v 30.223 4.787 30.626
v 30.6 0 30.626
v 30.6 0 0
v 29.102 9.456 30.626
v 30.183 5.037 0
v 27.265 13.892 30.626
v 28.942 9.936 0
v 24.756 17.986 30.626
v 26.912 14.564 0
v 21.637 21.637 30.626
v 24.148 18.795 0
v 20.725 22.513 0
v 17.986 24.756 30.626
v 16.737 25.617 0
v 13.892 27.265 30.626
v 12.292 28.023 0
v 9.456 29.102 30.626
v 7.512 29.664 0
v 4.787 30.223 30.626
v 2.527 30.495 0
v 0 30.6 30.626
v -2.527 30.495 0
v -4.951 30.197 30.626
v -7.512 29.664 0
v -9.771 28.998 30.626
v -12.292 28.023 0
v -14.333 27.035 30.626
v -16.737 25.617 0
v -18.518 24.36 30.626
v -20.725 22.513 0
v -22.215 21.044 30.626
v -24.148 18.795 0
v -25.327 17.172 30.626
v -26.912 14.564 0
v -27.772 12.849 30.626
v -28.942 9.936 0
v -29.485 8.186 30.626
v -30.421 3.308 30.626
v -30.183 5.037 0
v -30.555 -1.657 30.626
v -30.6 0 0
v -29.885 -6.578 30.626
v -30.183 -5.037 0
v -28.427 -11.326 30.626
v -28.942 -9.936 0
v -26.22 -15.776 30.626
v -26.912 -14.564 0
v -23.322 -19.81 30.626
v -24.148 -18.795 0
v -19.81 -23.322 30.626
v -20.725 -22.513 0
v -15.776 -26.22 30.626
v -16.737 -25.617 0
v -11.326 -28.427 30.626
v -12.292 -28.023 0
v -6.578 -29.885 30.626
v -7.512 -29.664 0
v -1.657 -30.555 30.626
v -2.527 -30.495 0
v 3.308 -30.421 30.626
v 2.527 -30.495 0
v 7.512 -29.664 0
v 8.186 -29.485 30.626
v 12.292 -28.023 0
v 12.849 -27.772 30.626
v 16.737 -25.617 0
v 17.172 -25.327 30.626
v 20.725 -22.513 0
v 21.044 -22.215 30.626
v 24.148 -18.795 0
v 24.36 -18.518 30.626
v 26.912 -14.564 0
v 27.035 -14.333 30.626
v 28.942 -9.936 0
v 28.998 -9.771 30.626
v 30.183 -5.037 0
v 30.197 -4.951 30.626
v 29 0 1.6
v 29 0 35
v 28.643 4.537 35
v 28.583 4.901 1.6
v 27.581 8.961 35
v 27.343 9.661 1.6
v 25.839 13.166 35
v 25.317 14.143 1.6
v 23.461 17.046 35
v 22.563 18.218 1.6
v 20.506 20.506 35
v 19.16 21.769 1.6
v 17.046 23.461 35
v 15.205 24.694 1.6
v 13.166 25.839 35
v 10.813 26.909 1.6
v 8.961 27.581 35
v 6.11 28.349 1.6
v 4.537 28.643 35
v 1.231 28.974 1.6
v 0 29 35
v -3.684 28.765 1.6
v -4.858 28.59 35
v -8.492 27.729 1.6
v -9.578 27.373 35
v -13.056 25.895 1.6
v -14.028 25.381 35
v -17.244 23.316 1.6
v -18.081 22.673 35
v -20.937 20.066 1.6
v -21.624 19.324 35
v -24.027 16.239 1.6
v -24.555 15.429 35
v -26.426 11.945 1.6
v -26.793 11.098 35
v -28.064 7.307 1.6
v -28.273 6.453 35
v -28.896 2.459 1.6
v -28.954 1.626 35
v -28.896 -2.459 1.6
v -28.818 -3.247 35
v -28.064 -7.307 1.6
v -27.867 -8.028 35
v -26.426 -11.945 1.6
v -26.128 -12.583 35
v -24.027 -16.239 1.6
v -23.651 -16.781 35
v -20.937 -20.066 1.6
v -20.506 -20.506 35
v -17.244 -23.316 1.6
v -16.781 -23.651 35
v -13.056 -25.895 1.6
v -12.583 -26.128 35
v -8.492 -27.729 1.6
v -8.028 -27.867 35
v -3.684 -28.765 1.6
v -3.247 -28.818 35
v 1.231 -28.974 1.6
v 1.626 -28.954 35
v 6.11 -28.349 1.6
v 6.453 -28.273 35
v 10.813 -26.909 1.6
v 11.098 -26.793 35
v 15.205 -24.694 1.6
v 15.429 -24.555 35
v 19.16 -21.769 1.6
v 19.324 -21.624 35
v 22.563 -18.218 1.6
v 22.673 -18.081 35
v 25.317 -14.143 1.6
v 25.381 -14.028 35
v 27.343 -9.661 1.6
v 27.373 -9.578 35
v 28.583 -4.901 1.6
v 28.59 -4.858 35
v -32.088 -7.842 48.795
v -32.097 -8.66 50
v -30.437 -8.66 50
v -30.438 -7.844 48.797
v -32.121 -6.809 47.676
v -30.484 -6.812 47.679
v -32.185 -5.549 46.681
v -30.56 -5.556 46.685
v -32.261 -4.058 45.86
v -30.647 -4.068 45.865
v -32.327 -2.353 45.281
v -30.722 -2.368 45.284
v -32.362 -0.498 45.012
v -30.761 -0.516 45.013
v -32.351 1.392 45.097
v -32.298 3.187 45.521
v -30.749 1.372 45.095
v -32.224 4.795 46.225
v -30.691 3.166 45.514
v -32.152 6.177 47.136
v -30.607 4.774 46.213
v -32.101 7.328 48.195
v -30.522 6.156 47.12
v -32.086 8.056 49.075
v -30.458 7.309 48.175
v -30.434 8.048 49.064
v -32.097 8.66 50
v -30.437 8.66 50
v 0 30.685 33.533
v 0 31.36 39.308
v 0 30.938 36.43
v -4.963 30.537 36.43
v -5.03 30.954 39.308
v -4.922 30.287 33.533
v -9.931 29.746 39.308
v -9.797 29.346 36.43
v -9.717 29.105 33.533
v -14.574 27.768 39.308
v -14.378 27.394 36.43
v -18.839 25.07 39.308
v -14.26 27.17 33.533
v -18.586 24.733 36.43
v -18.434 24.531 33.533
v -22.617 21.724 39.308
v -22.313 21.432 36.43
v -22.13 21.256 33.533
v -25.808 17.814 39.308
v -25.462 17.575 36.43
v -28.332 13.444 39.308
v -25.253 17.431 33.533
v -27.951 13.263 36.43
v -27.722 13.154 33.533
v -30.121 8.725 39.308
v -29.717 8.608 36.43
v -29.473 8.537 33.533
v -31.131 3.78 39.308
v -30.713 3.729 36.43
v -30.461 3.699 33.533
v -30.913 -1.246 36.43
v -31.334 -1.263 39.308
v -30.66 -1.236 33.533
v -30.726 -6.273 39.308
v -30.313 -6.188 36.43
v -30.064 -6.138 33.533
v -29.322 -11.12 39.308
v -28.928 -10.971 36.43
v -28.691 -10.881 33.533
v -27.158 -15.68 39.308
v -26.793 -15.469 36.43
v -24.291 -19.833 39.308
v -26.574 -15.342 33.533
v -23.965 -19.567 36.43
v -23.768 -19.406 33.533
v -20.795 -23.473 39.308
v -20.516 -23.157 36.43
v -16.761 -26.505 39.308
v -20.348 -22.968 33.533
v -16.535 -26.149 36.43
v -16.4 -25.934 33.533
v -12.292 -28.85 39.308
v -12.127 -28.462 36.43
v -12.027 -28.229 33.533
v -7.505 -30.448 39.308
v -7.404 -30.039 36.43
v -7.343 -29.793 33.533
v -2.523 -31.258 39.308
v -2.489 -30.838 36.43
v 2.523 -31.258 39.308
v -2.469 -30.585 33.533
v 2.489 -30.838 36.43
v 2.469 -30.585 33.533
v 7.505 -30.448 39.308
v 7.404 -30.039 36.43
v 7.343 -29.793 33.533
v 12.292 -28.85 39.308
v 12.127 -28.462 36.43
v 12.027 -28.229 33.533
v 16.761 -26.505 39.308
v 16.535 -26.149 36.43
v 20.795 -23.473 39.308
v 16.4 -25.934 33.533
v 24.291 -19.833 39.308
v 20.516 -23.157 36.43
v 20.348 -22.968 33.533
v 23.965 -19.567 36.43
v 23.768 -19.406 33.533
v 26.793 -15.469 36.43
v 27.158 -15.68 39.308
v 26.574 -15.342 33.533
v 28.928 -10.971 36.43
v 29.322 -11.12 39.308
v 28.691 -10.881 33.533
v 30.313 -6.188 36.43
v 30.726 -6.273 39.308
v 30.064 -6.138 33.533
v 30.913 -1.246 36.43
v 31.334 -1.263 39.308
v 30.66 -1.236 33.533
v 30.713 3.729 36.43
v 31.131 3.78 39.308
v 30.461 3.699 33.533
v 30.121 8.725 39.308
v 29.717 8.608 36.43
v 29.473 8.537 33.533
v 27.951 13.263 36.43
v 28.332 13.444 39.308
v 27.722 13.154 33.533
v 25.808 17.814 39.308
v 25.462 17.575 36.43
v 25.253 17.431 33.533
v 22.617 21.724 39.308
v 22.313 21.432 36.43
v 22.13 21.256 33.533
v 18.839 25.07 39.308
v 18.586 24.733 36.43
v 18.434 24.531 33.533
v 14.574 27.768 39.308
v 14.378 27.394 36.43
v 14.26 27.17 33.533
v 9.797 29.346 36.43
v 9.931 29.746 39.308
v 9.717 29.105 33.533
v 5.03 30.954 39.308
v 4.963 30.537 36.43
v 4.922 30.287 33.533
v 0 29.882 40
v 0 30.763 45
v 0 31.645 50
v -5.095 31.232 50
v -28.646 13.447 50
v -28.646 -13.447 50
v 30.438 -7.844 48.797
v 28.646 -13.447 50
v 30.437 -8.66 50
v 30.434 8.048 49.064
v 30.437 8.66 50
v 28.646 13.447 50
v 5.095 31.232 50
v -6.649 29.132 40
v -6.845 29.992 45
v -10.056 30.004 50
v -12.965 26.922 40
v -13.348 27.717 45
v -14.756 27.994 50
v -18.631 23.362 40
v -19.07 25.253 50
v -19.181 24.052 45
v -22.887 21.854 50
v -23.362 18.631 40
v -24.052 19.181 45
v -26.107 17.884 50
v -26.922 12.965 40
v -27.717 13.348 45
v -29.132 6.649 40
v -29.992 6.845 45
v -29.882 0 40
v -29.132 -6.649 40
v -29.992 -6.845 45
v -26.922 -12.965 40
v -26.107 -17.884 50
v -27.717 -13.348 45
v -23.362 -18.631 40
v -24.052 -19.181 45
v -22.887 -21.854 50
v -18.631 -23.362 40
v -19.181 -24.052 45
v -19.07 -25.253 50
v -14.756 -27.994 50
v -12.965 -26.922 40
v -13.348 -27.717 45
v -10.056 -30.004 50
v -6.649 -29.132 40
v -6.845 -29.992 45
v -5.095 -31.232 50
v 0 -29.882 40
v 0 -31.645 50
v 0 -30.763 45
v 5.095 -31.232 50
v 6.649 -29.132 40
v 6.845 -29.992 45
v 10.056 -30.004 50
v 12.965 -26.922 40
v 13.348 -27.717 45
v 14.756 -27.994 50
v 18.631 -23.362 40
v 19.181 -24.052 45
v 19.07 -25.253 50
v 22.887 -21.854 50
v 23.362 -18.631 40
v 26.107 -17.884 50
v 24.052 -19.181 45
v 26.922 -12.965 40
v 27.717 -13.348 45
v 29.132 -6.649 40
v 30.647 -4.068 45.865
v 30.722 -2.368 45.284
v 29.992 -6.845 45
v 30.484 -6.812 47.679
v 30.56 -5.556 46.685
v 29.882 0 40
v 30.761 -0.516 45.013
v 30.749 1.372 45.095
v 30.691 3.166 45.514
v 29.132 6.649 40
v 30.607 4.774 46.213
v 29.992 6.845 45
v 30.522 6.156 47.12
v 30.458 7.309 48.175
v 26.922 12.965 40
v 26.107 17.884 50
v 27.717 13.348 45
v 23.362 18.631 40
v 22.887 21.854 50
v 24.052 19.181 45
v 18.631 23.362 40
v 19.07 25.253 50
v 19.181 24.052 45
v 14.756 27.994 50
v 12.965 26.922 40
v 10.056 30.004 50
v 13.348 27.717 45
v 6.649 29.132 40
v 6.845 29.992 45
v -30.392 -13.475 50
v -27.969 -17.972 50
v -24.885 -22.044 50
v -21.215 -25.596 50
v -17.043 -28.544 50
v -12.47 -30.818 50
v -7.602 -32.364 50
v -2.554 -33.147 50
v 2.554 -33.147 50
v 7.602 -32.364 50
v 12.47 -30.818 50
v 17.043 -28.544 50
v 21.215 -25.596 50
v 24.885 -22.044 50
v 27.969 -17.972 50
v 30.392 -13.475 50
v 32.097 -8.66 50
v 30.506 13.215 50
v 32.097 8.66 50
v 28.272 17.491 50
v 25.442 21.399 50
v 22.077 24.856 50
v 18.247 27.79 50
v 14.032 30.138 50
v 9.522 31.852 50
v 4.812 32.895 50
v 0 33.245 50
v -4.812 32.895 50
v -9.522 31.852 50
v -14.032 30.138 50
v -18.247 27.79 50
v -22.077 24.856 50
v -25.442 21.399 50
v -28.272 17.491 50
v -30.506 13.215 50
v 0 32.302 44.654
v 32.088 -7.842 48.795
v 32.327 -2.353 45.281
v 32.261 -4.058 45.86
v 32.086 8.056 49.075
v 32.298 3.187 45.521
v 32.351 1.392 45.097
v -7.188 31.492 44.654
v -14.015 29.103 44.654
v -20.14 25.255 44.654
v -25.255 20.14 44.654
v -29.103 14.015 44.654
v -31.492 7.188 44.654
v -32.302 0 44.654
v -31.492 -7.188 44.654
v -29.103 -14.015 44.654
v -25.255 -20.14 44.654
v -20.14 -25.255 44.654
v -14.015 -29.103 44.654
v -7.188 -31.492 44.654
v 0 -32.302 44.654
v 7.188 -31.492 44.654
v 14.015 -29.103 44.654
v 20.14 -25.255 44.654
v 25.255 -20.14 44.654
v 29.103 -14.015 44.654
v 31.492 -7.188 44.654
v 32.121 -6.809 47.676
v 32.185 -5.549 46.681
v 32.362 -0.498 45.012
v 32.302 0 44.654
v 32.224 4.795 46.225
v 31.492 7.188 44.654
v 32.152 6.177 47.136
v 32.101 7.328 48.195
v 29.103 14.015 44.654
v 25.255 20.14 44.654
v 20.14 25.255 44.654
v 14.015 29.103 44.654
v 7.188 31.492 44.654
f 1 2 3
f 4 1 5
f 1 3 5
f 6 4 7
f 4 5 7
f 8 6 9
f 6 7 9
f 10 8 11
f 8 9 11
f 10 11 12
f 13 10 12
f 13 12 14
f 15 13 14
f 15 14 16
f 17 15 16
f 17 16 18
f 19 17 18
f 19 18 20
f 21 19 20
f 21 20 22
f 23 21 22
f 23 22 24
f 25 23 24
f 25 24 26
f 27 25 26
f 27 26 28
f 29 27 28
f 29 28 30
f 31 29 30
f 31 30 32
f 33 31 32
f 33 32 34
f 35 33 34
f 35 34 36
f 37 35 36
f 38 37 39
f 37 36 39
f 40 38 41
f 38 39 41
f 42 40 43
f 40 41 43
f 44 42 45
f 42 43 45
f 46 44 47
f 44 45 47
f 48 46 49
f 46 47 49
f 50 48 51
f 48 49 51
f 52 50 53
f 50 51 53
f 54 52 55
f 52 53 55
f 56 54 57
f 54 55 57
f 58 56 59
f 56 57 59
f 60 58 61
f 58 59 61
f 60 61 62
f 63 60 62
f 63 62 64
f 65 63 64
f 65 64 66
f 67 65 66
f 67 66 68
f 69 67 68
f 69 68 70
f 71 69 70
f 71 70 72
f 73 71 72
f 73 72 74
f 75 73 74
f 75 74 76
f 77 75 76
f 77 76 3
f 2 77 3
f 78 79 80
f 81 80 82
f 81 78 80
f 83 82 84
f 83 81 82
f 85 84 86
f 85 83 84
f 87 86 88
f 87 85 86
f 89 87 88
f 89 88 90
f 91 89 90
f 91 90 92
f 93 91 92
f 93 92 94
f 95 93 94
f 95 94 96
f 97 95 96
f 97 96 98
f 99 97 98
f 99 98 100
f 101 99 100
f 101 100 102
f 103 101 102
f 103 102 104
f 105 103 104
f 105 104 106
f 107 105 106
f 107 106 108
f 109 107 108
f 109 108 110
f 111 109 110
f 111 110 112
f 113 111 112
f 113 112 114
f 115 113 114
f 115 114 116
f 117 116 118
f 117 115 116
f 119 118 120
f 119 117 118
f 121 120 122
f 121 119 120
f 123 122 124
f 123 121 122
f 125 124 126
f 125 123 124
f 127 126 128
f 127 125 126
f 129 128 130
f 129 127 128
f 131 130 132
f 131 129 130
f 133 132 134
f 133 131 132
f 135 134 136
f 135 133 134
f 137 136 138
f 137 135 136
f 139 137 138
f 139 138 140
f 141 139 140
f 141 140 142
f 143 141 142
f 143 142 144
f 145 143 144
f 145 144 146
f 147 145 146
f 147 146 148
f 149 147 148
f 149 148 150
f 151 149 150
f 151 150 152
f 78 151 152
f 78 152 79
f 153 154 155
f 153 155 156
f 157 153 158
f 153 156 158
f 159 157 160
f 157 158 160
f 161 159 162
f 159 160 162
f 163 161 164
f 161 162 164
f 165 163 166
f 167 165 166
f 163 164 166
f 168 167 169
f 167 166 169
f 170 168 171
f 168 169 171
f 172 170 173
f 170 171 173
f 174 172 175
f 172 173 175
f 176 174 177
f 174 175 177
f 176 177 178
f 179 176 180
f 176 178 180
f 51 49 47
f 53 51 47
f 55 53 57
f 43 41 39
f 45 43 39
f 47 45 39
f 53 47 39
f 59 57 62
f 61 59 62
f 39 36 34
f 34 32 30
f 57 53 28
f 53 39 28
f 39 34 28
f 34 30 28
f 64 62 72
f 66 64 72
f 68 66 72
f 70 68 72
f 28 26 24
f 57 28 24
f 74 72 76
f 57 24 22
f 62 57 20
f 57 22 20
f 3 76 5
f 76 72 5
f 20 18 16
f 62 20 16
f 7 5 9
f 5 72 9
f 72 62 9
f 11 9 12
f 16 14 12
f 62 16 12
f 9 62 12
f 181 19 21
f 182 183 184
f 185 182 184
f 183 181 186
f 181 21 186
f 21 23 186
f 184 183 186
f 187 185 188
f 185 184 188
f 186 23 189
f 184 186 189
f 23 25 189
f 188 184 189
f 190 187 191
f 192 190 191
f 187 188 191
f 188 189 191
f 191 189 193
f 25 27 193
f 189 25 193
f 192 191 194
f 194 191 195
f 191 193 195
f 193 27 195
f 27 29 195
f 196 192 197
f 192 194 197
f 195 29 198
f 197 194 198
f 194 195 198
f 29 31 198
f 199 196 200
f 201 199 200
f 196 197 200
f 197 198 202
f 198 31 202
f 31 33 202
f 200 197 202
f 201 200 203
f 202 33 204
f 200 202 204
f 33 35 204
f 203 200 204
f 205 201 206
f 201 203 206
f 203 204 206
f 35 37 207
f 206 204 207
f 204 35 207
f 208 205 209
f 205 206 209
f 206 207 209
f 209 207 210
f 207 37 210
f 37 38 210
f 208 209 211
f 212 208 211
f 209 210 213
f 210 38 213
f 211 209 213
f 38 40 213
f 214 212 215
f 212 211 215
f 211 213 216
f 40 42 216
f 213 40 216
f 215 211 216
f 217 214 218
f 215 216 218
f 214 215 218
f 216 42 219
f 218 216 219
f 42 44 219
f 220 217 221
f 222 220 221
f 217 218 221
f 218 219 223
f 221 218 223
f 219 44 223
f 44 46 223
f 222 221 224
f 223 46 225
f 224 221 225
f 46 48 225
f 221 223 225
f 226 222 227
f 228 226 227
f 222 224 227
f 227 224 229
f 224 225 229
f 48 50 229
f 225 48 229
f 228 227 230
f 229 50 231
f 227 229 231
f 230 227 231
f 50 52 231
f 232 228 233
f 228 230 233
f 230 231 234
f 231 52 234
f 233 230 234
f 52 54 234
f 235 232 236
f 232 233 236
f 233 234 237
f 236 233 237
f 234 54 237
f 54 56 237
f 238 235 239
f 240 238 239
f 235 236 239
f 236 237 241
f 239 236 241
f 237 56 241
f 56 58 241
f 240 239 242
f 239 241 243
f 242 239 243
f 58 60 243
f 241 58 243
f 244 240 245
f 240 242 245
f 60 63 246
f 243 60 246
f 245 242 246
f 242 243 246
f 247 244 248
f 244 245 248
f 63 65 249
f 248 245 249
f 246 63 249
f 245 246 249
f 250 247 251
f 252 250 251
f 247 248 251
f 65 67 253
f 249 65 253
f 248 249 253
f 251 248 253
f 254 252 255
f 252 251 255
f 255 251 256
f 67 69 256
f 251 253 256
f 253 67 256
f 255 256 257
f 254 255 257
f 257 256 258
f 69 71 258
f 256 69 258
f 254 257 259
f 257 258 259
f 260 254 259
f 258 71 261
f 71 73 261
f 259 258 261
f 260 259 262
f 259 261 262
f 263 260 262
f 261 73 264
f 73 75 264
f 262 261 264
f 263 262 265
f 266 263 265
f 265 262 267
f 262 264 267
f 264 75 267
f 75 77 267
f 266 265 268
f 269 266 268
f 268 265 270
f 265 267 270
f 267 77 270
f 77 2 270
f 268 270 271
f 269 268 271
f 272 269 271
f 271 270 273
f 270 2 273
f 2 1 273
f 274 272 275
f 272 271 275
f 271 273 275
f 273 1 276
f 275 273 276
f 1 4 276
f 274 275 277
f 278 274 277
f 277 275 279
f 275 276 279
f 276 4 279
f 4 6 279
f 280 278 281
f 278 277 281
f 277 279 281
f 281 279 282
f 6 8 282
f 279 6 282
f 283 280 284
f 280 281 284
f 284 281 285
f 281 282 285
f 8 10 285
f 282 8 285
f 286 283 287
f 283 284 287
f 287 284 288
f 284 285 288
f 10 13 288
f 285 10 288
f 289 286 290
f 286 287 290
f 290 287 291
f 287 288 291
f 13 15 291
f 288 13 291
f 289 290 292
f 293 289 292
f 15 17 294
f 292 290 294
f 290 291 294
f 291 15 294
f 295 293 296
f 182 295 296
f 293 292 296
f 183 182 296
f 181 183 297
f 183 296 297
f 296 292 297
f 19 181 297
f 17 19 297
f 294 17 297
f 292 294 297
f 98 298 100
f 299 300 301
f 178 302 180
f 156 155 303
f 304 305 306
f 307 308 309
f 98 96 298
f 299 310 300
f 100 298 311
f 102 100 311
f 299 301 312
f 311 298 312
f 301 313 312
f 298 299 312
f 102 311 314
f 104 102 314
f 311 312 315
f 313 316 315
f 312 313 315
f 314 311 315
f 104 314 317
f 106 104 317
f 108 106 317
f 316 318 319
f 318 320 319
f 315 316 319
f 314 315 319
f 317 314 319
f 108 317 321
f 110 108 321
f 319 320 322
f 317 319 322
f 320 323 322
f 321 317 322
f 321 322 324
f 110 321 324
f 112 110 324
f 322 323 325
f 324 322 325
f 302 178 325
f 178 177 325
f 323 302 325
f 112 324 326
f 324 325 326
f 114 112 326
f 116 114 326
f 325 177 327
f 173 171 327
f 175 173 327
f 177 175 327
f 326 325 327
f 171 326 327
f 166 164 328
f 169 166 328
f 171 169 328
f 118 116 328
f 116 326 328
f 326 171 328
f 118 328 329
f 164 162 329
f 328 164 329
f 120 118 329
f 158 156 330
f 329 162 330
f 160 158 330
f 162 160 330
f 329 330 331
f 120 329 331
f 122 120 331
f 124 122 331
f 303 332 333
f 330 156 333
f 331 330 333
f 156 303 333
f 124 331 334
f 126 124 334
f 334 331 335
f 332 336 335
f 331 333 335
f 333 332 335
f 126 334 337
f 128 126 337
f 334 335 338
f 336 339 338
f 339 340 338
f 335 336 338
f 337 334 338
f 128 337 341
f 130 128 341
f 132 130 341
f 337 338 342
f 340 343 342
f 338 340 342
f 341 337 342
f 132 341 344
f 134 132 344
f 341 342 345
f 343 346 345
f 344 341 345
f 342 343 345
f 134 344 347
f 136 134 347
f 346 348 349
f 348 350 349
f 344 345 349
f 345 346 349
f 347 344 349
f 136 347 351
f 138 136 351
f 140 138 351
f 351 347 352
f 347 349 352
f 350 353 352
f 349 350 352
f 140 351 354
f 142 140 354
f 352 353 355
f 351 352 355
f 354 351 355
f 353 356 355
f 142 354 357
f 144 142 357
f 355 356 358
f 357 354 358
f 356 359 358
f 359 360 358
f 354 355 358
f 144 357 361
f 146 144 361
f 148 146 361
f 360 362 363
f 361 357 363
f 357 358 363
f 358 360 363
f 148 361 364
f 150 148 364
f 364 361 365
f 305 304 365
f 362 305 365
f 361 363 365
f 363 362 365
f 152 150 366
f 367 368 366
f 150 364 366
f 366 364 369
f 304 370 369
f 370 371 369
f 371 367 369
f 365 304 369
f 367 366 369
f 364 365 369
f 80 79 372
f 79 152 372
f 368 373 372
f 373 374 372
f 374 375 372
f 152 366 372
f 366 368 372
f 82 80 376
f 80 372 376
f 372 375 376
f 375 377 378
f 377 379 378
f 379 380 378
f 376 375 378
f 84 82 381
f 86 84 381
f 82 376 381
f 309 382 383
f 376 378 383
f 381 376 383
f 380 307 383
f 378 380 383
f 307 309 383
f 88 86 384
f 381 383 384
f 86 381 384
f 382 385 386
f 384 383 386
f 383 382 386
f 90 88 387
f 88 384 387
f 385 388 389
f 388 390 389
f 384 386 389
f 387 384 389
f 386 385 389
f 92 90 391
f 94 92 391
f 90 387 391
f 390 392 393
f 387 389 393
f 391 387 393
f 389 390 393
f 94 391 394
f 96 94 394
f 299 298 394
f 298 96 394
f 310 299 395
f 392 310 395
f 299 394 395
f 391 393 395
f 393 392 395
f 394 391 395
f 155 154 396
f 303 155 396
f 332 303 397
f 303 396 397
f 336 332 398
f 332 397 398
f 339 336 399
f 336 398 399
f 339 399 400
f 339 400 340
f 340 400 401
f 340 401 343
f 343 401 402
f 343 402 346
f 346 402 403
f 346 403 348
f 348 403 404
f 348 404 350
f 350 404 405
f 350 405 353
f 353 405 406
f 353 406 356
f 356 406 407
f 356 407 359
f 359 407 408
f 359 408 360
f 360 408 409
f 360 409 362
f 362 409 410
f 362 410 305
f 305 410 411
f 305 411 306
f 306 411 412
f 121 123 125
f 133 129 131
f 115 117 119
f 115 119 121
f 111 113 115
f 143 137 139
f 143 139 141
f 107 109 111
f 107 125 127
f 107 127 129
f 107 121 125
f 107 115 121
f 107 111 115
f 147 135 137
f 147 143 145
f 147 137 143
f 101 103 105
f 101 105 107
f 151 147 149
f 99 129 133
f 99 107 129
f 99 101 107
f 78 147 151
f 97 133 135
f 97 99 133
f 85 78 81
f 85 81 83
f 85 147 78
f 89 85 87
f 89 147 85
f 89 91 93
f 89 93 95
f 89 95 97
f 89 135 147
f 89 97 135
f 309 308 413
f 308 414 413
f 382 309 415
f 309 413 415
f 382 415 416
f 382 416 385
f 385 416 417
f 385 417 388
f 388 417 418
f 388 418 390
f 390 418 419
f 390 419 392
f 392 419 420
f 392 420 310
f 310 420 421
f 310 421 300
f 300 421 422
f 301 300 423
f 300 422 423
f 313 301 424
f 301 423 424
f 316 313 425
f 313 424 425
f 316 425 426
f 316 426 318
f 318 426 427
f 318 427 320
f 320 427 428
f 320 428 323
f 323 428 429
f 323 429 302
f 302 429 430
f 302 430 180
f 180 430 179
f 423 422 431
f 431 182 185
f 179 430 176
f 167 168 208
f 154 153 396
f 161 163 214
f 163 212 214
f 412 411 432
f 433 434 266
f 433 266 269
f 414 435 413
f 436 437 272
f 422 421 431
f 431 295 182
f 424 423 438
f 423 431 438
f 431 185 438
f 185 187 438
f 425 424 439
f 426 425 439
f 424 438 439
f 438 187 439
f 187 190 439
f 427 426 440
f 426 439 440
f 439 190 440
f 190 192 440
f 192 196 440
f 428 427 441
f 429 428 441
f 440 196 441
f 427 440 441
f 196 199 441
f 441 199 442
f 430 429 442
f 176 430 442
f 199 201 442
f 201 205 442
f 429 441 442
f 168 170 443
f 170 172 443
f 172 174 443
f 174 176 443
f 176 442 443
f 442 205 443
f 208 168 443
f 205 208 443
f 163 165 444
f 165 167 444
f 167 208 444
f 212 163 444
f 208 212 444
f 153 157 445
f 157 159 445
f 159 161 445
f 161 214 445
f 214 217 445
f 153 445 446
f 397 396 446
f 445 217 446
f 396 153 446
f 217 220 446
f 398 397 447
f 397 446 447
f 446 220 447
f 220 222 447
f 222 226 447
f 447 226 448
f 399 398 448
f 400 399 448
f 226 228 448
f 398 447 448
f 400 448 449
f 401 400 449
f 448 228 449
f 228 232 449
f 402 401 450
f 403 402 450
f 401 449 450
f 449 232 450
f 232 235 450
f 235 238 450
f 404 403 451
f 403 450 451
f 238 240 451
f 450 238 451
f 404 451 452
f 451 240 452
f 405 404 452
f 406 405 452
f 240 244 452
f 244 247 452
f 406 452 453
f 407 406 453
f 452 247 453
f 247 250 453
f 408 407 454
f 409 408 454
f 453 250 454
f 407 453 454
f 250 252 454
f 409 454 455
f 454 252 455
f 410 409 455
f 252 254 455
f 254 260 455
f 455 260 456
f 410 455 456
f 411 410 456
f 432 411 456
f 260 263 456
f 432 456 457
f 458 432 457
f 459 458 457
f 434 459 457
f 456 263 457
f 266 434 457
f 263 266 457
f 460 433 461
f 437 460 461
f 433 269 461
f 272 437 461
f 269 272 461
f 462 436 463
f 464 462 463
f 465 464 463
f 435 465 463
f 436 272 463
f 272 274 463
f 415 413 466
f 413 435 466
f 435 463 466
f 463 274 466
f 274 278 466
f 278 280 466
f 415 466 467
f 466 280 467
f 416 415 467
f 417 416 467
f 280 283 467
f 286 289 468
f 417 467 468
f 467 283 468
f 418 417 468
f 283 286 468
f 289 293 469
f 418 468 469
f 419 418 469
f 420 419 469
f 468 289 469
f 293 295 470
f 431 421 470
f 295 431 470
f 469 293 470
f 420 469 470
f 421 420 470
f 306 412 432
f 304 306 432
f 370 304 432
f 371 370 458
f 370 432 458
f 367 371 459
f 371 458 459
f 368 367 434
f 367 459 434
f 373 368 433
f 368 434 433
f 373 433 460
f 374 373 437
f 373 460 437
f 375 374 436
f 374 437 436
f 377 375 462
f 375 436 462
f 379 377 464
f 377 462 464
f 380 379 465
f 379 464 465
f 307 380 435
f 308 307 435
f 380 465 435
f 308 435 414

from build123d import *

# Parameters (mm, degrees)
F0_R     = 29
F1_DEPTH = 1.6
F0_R_2   = 30.6
F2_DEPTH = 35
F5_R     = 10
F6_DEPTH = 40


with BuildPart() as f1:
    # F0 (on Top) → F1 (new body)
    with BuildSketch(Plane.XY):
        Circle(F0_R)
    extrude(amount=F1_DEPTH)

    # F0 (on Top) → F2 (join)
    with BuildSketch(Plane.XY):
        Circle(F0_R_2)
        Circle(F0_R, mode=Mode.SUBTRACT)
    extrude(amount=F2_DEPTH)

    # F4: sweep along a path in F4_path
    with BuildLine(Plane(origin=(30.6, 0, 35), x_dir=(0, 1, 0), z_dir=(0, 0, 1))) as f4_path:
        CenterArc((0, 30.6), 30.6, 0, 360)
    # F3 (on Front) → F4 (sweep)
    with BuildSketch(Plane.XZ):
        with BuildLine():
            Line((-33.2449047106, 50), (-31.3596123494, 39.3079757071))
            ThreePointArc((-31.3596123494, 39.3079757071), (-30.7902650954, 34.9833539611), (-30.6, 30.6255668237))
            Line((-30.6, 30.6255668237), (-30.6, 35))
            Line((-30.6, 35), (-29, 35))
            Line((-29, 35), (-31.6449047106, 50))
            Line((-31.6449047106, 50), (-33.2449047106, 50))
        make_face()
    sweep(path=f4_path.line)

    # F5 (on Right) → F6 (cut, symmetric)
    with BuildSketch(Plane.YZ):
        with Locations((0, 55)):
            Circle(F5_R)
    extrude(amount=F6_DEPTH, both=True, mode=Mode.SUBTRACT)


solid = f1.part
